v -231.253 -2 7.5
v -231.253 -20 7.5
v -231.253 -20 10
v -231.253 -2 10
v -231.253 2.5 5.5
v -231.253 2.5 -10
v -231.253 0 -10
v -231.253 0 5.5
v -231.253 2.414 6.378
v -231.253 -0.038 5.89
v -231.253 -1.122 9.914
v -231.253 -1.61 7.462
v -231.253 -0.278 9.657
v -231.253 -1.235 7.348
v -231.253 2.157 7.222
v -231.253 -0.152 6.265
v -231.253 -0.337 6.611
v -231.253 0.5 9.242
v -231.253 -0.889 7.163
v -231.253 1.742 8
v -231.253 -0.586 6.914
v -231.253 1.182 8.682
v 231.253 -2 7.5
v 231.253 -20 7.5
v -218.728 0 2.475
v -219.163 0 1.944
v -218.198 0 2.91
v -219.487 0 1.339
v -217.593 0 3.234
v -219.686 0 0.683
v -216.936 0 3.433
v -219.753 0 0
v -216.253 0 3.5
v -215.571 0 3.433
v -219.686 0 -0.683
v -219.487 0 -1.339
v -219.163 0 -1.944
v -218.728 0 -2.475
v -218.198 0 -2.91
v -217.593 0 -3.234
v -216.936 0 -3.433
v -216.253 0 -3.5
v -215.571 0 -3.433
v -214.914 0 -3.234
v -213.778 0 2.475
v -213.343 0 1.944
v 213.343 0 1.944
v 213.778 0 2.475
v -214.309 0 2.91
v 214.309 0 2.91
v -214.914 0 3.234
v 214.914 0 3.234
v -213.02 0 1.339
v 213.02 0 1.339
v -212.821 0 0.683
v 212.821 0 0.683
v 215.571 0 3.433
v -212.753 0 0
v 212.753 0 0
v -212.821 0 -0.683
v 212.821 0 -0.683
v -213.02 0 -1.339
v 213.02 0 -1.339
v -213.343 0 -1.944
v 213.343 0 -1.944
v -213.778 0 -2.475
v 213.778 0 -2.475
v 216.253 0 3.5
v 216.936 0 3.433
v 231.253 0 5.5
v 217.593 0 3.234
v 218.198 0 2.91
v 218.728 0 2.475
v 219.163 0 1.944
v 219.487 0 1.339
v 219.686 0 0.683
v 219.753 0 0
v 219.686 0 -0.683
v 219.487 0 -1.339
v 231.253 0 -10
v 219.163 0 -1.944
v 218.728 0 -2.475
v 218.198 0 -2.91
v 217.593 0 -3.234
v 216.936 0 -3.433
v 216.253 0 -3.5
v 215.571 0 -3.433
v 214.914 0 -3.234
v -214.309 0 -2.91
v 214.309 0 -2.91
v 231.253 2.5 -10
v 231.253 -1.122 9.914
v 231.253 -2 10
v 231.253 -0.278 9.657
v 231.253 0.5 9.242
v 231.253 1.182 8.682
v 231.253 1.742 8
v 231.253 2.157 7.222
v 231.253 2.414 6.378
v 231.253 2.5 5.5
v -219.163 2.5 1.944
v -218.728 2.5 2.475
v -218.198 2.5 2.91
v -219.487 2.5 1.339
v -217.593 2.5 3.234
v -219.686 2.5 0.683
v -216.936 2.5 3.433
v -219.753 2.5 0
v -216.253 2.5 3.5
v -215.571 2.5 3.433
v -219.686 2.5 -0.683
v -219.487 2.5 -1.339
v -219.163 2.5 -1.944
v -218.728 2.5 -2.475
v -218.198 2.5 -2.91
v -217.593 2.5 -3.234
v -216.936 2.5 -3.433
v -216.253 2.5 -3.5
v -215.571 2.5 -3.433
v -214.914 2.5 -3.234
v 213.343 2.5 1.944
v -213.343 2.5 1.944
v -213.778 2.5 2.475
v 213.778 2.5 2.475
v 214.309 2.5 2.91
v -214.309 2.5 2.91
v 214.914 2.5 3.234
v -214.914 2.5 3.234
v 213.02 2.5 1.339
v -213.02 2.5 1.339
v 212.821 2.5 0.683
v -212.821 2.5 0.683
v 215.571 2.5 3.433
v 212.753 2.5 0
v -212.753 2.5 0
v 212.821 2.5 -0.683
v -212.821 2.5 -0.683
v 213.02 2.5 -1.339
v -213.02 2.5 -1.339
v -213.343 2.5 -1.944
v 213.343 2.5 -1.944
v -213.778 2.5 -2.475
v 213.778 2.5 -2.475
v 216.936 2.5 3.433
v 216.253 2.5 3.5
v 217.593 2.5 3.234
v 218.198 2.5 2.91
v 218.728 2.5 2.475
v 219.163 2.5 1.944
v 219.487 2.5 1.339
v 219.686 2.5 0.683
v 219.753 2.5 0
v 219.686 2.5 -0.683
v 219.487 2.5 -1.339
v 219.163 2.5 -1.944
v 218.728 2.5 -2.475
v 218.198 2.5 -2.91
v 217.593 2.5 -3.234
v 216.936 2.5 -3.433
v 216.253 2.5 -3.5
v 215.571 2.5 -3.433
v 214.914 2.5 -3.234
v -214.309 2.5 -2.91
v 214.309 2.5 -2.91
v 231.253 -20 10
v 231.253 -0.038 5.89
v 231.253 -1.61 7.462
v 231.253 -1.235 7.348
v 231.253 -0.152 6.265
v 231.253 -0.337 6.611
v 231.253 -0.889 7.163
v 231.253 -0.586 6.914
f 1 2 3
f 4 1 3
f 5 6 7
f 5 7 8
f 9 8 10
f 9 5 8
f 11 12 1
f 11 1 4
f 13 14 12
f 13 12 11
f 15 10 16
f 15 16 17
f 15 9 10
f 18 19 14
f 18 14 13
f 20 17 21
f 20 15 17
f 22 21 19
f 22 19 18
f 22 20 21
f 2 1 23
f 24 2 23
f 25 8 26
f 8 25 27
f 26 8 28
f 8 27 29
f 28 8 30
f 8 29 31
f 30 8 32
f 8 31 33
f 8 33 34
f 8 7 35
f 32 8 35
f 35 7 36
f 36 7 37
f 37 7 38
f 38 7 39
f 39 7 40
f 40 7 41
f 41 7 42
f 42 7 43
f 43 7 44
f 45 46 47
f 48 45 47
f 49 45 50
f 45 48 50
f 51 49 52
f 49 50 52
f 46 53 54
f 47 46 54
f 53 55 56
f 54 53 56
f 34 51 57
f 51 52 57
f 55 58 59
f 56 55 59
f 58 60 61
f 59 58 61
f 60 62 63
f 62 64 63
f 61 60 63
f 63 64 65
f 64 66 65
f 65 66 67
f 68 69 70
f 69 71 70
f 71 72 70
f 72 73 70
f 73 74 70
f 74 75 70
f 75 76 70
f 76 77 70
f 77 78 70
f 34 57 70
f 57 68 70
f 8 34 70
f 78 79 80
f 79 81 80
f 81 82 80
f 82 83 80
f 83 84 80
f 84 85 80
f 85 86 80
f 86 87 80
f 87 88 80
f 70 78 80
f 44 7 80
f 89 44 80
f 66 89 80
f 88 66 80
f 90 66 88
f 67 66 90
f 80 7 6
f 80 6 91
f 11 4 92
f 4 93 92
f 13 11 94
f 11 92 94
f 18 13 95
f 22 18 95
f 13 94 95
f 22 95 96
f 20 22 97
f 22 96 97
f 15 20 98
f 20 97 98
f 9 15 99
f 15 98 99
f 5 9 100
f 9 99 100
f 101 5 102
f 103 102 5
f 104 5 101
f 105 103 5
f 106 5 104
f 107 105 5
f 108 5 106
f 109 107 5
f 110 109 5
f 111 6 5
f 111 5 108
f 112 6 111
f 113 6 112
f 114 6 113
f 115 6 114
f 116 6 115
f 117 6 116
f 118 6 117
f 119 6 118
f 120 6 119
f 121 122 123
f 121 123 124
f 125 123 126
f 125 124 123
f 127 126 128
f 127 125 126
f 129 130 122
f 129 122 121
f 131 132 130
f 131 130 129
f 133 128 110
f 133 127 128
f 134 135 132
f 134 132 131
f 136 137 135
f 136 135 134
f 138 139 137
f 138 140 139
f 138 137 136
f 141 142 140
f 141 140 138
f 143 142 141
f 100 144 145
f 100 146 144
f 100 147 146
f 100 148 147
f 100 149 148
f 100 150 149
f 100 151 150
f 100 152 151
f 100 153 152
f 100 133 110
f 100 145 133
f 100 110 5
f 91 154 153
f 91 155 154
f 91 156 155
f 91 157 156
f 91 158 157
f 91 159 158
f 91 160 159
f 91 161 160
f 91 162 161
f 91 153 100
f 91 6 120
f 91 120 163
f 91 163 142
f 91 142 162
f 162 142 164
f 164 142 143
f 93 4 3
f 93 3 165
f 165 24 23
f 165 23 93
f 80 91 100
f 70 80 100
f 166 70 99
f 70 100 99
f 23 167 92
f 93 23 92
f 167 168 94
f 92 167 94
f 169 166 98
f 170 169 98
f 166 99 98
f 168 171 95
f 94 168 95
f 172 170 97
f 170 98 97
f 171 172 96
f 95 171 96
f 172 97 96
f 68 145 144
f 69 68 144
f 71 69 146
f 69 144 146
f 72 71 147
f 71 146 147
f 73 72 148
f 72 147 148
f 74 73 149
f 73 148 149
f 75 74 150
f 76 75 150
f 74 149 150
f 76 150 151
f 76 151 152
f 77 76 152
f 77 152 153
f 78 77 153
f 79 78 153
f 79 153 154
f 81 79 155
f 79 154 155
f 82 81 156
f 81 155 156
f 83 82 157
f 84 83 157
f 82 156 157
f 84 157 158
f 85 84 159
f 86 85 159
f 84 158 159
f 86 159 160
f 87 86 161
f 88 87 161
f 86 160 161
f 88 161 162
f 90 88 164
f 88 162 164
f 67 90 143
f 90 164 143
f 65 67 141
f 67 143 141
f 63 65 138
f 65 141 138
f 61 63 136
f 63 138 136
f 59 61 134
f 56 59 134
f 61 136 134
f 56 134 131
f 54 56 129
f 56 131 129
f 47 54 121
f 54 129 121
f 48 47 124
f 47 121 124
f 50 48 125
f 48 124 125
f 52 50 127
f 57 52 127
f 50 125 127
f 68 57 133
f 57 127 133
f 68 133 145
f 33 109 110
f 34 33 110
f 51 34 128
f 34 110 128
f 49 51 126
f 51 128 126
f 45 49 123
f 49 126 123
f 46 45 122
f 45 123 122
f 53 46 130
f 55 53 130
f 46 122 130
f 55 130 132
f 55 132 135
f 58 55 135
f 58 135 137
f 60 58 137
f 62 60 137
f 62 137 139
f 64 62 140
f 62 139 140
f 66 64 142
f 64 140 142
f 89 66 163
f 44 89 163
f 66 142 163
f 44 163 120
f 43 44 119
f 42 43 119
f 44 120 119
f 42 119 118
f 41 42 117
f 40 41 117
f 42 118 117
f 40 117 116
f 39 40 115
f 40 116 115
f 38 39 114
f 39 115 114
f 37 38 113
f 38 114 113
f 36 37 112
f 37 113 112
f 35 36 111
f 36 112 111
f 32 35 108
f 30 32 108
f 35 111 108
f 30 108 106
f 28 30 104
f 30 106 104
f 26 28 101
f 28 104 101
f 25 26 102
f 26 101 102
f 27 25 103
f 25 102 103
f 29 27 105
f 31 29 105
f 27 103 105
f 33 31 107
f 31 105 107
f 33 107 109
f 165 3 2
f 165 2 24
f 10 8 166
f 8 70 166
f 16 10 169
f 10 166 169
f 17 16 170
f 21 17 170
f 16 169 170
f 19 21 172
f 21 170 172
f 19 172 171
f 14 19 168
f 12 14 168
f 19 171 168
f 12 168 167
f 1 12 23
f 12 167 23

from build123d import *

# Parameters (mm, degrees)
SKETCH1_W           = 462.50664735
SKETCH1_H           = 20
BOSS_EXTRUDE1_DEPTH = 2.5
SKETCH2_R           = 3.5
CUT_EXTRUDE1_DEPTH  = 2.5
SKETCH3_W           = 462.50664735
SKETCH3_H           = 2.5
BOSS_EXTRUDE2_DEPTH = 20
FILLET1_R           = 2
FILLET2_R           = 4.5


with BuildPart() as part:
    # Sketch1 → Boss-Extrude1 (new body)
    with BuildSketch(Plane(origin=(0, 0, 0), x_dir=(1, 0, 0), z_dir=(0, 1, 0))):
        Rectangle(SKETCH1_W, SKETCH1_H)
    extrude(amount=BOSS_EXTRUDE1_DEPTH)

    # Sketch2 → Cut-Extrude1 (cut)
    with BuildSketch(Plane(origin=(0, 2.5, 0), x_dir=(1, 0, 0), z_dir=(0, 1, 0))):
        with Locations(Location((216.253323675, 0, 0), (0, 0, 270))):
            Circle(SKETCH2_R)
        with Locations(Location((-216.253323675, 0, 0), (0, 0, 270))):
            Circle(SKETCH2_R)
    extrude(amount=-CUT_EXTRUDE1_DEPTH, mode=Mode.SUBTRACT)

    # Sketch3 → Boss-Extrude2 (add)
    with BuildSketch(Plane.XZ):
        with Locations((0, 8.75)):
            Rectangle(SKETCH3_W, SKETCH3_H)
    extrude(amount=BOSS_EXTRUDE2_DEPTH)

    # Fillet1
    fillet1_edges = [part.edges().sort_by_distance(p)[0] for p in [
        (0, 0, 7.5),
    ]]
    fillet(fillet1_edges, radius=FILLET1_R)

    # Fillet2
    fillet2_edges = [part.edges().sort_by_distance(p)[0] for p in [
        (0, 2.5, 10),
    ]]
    fillet(fillet2_edges, radius=FILLET2_R)


solid = part.part
